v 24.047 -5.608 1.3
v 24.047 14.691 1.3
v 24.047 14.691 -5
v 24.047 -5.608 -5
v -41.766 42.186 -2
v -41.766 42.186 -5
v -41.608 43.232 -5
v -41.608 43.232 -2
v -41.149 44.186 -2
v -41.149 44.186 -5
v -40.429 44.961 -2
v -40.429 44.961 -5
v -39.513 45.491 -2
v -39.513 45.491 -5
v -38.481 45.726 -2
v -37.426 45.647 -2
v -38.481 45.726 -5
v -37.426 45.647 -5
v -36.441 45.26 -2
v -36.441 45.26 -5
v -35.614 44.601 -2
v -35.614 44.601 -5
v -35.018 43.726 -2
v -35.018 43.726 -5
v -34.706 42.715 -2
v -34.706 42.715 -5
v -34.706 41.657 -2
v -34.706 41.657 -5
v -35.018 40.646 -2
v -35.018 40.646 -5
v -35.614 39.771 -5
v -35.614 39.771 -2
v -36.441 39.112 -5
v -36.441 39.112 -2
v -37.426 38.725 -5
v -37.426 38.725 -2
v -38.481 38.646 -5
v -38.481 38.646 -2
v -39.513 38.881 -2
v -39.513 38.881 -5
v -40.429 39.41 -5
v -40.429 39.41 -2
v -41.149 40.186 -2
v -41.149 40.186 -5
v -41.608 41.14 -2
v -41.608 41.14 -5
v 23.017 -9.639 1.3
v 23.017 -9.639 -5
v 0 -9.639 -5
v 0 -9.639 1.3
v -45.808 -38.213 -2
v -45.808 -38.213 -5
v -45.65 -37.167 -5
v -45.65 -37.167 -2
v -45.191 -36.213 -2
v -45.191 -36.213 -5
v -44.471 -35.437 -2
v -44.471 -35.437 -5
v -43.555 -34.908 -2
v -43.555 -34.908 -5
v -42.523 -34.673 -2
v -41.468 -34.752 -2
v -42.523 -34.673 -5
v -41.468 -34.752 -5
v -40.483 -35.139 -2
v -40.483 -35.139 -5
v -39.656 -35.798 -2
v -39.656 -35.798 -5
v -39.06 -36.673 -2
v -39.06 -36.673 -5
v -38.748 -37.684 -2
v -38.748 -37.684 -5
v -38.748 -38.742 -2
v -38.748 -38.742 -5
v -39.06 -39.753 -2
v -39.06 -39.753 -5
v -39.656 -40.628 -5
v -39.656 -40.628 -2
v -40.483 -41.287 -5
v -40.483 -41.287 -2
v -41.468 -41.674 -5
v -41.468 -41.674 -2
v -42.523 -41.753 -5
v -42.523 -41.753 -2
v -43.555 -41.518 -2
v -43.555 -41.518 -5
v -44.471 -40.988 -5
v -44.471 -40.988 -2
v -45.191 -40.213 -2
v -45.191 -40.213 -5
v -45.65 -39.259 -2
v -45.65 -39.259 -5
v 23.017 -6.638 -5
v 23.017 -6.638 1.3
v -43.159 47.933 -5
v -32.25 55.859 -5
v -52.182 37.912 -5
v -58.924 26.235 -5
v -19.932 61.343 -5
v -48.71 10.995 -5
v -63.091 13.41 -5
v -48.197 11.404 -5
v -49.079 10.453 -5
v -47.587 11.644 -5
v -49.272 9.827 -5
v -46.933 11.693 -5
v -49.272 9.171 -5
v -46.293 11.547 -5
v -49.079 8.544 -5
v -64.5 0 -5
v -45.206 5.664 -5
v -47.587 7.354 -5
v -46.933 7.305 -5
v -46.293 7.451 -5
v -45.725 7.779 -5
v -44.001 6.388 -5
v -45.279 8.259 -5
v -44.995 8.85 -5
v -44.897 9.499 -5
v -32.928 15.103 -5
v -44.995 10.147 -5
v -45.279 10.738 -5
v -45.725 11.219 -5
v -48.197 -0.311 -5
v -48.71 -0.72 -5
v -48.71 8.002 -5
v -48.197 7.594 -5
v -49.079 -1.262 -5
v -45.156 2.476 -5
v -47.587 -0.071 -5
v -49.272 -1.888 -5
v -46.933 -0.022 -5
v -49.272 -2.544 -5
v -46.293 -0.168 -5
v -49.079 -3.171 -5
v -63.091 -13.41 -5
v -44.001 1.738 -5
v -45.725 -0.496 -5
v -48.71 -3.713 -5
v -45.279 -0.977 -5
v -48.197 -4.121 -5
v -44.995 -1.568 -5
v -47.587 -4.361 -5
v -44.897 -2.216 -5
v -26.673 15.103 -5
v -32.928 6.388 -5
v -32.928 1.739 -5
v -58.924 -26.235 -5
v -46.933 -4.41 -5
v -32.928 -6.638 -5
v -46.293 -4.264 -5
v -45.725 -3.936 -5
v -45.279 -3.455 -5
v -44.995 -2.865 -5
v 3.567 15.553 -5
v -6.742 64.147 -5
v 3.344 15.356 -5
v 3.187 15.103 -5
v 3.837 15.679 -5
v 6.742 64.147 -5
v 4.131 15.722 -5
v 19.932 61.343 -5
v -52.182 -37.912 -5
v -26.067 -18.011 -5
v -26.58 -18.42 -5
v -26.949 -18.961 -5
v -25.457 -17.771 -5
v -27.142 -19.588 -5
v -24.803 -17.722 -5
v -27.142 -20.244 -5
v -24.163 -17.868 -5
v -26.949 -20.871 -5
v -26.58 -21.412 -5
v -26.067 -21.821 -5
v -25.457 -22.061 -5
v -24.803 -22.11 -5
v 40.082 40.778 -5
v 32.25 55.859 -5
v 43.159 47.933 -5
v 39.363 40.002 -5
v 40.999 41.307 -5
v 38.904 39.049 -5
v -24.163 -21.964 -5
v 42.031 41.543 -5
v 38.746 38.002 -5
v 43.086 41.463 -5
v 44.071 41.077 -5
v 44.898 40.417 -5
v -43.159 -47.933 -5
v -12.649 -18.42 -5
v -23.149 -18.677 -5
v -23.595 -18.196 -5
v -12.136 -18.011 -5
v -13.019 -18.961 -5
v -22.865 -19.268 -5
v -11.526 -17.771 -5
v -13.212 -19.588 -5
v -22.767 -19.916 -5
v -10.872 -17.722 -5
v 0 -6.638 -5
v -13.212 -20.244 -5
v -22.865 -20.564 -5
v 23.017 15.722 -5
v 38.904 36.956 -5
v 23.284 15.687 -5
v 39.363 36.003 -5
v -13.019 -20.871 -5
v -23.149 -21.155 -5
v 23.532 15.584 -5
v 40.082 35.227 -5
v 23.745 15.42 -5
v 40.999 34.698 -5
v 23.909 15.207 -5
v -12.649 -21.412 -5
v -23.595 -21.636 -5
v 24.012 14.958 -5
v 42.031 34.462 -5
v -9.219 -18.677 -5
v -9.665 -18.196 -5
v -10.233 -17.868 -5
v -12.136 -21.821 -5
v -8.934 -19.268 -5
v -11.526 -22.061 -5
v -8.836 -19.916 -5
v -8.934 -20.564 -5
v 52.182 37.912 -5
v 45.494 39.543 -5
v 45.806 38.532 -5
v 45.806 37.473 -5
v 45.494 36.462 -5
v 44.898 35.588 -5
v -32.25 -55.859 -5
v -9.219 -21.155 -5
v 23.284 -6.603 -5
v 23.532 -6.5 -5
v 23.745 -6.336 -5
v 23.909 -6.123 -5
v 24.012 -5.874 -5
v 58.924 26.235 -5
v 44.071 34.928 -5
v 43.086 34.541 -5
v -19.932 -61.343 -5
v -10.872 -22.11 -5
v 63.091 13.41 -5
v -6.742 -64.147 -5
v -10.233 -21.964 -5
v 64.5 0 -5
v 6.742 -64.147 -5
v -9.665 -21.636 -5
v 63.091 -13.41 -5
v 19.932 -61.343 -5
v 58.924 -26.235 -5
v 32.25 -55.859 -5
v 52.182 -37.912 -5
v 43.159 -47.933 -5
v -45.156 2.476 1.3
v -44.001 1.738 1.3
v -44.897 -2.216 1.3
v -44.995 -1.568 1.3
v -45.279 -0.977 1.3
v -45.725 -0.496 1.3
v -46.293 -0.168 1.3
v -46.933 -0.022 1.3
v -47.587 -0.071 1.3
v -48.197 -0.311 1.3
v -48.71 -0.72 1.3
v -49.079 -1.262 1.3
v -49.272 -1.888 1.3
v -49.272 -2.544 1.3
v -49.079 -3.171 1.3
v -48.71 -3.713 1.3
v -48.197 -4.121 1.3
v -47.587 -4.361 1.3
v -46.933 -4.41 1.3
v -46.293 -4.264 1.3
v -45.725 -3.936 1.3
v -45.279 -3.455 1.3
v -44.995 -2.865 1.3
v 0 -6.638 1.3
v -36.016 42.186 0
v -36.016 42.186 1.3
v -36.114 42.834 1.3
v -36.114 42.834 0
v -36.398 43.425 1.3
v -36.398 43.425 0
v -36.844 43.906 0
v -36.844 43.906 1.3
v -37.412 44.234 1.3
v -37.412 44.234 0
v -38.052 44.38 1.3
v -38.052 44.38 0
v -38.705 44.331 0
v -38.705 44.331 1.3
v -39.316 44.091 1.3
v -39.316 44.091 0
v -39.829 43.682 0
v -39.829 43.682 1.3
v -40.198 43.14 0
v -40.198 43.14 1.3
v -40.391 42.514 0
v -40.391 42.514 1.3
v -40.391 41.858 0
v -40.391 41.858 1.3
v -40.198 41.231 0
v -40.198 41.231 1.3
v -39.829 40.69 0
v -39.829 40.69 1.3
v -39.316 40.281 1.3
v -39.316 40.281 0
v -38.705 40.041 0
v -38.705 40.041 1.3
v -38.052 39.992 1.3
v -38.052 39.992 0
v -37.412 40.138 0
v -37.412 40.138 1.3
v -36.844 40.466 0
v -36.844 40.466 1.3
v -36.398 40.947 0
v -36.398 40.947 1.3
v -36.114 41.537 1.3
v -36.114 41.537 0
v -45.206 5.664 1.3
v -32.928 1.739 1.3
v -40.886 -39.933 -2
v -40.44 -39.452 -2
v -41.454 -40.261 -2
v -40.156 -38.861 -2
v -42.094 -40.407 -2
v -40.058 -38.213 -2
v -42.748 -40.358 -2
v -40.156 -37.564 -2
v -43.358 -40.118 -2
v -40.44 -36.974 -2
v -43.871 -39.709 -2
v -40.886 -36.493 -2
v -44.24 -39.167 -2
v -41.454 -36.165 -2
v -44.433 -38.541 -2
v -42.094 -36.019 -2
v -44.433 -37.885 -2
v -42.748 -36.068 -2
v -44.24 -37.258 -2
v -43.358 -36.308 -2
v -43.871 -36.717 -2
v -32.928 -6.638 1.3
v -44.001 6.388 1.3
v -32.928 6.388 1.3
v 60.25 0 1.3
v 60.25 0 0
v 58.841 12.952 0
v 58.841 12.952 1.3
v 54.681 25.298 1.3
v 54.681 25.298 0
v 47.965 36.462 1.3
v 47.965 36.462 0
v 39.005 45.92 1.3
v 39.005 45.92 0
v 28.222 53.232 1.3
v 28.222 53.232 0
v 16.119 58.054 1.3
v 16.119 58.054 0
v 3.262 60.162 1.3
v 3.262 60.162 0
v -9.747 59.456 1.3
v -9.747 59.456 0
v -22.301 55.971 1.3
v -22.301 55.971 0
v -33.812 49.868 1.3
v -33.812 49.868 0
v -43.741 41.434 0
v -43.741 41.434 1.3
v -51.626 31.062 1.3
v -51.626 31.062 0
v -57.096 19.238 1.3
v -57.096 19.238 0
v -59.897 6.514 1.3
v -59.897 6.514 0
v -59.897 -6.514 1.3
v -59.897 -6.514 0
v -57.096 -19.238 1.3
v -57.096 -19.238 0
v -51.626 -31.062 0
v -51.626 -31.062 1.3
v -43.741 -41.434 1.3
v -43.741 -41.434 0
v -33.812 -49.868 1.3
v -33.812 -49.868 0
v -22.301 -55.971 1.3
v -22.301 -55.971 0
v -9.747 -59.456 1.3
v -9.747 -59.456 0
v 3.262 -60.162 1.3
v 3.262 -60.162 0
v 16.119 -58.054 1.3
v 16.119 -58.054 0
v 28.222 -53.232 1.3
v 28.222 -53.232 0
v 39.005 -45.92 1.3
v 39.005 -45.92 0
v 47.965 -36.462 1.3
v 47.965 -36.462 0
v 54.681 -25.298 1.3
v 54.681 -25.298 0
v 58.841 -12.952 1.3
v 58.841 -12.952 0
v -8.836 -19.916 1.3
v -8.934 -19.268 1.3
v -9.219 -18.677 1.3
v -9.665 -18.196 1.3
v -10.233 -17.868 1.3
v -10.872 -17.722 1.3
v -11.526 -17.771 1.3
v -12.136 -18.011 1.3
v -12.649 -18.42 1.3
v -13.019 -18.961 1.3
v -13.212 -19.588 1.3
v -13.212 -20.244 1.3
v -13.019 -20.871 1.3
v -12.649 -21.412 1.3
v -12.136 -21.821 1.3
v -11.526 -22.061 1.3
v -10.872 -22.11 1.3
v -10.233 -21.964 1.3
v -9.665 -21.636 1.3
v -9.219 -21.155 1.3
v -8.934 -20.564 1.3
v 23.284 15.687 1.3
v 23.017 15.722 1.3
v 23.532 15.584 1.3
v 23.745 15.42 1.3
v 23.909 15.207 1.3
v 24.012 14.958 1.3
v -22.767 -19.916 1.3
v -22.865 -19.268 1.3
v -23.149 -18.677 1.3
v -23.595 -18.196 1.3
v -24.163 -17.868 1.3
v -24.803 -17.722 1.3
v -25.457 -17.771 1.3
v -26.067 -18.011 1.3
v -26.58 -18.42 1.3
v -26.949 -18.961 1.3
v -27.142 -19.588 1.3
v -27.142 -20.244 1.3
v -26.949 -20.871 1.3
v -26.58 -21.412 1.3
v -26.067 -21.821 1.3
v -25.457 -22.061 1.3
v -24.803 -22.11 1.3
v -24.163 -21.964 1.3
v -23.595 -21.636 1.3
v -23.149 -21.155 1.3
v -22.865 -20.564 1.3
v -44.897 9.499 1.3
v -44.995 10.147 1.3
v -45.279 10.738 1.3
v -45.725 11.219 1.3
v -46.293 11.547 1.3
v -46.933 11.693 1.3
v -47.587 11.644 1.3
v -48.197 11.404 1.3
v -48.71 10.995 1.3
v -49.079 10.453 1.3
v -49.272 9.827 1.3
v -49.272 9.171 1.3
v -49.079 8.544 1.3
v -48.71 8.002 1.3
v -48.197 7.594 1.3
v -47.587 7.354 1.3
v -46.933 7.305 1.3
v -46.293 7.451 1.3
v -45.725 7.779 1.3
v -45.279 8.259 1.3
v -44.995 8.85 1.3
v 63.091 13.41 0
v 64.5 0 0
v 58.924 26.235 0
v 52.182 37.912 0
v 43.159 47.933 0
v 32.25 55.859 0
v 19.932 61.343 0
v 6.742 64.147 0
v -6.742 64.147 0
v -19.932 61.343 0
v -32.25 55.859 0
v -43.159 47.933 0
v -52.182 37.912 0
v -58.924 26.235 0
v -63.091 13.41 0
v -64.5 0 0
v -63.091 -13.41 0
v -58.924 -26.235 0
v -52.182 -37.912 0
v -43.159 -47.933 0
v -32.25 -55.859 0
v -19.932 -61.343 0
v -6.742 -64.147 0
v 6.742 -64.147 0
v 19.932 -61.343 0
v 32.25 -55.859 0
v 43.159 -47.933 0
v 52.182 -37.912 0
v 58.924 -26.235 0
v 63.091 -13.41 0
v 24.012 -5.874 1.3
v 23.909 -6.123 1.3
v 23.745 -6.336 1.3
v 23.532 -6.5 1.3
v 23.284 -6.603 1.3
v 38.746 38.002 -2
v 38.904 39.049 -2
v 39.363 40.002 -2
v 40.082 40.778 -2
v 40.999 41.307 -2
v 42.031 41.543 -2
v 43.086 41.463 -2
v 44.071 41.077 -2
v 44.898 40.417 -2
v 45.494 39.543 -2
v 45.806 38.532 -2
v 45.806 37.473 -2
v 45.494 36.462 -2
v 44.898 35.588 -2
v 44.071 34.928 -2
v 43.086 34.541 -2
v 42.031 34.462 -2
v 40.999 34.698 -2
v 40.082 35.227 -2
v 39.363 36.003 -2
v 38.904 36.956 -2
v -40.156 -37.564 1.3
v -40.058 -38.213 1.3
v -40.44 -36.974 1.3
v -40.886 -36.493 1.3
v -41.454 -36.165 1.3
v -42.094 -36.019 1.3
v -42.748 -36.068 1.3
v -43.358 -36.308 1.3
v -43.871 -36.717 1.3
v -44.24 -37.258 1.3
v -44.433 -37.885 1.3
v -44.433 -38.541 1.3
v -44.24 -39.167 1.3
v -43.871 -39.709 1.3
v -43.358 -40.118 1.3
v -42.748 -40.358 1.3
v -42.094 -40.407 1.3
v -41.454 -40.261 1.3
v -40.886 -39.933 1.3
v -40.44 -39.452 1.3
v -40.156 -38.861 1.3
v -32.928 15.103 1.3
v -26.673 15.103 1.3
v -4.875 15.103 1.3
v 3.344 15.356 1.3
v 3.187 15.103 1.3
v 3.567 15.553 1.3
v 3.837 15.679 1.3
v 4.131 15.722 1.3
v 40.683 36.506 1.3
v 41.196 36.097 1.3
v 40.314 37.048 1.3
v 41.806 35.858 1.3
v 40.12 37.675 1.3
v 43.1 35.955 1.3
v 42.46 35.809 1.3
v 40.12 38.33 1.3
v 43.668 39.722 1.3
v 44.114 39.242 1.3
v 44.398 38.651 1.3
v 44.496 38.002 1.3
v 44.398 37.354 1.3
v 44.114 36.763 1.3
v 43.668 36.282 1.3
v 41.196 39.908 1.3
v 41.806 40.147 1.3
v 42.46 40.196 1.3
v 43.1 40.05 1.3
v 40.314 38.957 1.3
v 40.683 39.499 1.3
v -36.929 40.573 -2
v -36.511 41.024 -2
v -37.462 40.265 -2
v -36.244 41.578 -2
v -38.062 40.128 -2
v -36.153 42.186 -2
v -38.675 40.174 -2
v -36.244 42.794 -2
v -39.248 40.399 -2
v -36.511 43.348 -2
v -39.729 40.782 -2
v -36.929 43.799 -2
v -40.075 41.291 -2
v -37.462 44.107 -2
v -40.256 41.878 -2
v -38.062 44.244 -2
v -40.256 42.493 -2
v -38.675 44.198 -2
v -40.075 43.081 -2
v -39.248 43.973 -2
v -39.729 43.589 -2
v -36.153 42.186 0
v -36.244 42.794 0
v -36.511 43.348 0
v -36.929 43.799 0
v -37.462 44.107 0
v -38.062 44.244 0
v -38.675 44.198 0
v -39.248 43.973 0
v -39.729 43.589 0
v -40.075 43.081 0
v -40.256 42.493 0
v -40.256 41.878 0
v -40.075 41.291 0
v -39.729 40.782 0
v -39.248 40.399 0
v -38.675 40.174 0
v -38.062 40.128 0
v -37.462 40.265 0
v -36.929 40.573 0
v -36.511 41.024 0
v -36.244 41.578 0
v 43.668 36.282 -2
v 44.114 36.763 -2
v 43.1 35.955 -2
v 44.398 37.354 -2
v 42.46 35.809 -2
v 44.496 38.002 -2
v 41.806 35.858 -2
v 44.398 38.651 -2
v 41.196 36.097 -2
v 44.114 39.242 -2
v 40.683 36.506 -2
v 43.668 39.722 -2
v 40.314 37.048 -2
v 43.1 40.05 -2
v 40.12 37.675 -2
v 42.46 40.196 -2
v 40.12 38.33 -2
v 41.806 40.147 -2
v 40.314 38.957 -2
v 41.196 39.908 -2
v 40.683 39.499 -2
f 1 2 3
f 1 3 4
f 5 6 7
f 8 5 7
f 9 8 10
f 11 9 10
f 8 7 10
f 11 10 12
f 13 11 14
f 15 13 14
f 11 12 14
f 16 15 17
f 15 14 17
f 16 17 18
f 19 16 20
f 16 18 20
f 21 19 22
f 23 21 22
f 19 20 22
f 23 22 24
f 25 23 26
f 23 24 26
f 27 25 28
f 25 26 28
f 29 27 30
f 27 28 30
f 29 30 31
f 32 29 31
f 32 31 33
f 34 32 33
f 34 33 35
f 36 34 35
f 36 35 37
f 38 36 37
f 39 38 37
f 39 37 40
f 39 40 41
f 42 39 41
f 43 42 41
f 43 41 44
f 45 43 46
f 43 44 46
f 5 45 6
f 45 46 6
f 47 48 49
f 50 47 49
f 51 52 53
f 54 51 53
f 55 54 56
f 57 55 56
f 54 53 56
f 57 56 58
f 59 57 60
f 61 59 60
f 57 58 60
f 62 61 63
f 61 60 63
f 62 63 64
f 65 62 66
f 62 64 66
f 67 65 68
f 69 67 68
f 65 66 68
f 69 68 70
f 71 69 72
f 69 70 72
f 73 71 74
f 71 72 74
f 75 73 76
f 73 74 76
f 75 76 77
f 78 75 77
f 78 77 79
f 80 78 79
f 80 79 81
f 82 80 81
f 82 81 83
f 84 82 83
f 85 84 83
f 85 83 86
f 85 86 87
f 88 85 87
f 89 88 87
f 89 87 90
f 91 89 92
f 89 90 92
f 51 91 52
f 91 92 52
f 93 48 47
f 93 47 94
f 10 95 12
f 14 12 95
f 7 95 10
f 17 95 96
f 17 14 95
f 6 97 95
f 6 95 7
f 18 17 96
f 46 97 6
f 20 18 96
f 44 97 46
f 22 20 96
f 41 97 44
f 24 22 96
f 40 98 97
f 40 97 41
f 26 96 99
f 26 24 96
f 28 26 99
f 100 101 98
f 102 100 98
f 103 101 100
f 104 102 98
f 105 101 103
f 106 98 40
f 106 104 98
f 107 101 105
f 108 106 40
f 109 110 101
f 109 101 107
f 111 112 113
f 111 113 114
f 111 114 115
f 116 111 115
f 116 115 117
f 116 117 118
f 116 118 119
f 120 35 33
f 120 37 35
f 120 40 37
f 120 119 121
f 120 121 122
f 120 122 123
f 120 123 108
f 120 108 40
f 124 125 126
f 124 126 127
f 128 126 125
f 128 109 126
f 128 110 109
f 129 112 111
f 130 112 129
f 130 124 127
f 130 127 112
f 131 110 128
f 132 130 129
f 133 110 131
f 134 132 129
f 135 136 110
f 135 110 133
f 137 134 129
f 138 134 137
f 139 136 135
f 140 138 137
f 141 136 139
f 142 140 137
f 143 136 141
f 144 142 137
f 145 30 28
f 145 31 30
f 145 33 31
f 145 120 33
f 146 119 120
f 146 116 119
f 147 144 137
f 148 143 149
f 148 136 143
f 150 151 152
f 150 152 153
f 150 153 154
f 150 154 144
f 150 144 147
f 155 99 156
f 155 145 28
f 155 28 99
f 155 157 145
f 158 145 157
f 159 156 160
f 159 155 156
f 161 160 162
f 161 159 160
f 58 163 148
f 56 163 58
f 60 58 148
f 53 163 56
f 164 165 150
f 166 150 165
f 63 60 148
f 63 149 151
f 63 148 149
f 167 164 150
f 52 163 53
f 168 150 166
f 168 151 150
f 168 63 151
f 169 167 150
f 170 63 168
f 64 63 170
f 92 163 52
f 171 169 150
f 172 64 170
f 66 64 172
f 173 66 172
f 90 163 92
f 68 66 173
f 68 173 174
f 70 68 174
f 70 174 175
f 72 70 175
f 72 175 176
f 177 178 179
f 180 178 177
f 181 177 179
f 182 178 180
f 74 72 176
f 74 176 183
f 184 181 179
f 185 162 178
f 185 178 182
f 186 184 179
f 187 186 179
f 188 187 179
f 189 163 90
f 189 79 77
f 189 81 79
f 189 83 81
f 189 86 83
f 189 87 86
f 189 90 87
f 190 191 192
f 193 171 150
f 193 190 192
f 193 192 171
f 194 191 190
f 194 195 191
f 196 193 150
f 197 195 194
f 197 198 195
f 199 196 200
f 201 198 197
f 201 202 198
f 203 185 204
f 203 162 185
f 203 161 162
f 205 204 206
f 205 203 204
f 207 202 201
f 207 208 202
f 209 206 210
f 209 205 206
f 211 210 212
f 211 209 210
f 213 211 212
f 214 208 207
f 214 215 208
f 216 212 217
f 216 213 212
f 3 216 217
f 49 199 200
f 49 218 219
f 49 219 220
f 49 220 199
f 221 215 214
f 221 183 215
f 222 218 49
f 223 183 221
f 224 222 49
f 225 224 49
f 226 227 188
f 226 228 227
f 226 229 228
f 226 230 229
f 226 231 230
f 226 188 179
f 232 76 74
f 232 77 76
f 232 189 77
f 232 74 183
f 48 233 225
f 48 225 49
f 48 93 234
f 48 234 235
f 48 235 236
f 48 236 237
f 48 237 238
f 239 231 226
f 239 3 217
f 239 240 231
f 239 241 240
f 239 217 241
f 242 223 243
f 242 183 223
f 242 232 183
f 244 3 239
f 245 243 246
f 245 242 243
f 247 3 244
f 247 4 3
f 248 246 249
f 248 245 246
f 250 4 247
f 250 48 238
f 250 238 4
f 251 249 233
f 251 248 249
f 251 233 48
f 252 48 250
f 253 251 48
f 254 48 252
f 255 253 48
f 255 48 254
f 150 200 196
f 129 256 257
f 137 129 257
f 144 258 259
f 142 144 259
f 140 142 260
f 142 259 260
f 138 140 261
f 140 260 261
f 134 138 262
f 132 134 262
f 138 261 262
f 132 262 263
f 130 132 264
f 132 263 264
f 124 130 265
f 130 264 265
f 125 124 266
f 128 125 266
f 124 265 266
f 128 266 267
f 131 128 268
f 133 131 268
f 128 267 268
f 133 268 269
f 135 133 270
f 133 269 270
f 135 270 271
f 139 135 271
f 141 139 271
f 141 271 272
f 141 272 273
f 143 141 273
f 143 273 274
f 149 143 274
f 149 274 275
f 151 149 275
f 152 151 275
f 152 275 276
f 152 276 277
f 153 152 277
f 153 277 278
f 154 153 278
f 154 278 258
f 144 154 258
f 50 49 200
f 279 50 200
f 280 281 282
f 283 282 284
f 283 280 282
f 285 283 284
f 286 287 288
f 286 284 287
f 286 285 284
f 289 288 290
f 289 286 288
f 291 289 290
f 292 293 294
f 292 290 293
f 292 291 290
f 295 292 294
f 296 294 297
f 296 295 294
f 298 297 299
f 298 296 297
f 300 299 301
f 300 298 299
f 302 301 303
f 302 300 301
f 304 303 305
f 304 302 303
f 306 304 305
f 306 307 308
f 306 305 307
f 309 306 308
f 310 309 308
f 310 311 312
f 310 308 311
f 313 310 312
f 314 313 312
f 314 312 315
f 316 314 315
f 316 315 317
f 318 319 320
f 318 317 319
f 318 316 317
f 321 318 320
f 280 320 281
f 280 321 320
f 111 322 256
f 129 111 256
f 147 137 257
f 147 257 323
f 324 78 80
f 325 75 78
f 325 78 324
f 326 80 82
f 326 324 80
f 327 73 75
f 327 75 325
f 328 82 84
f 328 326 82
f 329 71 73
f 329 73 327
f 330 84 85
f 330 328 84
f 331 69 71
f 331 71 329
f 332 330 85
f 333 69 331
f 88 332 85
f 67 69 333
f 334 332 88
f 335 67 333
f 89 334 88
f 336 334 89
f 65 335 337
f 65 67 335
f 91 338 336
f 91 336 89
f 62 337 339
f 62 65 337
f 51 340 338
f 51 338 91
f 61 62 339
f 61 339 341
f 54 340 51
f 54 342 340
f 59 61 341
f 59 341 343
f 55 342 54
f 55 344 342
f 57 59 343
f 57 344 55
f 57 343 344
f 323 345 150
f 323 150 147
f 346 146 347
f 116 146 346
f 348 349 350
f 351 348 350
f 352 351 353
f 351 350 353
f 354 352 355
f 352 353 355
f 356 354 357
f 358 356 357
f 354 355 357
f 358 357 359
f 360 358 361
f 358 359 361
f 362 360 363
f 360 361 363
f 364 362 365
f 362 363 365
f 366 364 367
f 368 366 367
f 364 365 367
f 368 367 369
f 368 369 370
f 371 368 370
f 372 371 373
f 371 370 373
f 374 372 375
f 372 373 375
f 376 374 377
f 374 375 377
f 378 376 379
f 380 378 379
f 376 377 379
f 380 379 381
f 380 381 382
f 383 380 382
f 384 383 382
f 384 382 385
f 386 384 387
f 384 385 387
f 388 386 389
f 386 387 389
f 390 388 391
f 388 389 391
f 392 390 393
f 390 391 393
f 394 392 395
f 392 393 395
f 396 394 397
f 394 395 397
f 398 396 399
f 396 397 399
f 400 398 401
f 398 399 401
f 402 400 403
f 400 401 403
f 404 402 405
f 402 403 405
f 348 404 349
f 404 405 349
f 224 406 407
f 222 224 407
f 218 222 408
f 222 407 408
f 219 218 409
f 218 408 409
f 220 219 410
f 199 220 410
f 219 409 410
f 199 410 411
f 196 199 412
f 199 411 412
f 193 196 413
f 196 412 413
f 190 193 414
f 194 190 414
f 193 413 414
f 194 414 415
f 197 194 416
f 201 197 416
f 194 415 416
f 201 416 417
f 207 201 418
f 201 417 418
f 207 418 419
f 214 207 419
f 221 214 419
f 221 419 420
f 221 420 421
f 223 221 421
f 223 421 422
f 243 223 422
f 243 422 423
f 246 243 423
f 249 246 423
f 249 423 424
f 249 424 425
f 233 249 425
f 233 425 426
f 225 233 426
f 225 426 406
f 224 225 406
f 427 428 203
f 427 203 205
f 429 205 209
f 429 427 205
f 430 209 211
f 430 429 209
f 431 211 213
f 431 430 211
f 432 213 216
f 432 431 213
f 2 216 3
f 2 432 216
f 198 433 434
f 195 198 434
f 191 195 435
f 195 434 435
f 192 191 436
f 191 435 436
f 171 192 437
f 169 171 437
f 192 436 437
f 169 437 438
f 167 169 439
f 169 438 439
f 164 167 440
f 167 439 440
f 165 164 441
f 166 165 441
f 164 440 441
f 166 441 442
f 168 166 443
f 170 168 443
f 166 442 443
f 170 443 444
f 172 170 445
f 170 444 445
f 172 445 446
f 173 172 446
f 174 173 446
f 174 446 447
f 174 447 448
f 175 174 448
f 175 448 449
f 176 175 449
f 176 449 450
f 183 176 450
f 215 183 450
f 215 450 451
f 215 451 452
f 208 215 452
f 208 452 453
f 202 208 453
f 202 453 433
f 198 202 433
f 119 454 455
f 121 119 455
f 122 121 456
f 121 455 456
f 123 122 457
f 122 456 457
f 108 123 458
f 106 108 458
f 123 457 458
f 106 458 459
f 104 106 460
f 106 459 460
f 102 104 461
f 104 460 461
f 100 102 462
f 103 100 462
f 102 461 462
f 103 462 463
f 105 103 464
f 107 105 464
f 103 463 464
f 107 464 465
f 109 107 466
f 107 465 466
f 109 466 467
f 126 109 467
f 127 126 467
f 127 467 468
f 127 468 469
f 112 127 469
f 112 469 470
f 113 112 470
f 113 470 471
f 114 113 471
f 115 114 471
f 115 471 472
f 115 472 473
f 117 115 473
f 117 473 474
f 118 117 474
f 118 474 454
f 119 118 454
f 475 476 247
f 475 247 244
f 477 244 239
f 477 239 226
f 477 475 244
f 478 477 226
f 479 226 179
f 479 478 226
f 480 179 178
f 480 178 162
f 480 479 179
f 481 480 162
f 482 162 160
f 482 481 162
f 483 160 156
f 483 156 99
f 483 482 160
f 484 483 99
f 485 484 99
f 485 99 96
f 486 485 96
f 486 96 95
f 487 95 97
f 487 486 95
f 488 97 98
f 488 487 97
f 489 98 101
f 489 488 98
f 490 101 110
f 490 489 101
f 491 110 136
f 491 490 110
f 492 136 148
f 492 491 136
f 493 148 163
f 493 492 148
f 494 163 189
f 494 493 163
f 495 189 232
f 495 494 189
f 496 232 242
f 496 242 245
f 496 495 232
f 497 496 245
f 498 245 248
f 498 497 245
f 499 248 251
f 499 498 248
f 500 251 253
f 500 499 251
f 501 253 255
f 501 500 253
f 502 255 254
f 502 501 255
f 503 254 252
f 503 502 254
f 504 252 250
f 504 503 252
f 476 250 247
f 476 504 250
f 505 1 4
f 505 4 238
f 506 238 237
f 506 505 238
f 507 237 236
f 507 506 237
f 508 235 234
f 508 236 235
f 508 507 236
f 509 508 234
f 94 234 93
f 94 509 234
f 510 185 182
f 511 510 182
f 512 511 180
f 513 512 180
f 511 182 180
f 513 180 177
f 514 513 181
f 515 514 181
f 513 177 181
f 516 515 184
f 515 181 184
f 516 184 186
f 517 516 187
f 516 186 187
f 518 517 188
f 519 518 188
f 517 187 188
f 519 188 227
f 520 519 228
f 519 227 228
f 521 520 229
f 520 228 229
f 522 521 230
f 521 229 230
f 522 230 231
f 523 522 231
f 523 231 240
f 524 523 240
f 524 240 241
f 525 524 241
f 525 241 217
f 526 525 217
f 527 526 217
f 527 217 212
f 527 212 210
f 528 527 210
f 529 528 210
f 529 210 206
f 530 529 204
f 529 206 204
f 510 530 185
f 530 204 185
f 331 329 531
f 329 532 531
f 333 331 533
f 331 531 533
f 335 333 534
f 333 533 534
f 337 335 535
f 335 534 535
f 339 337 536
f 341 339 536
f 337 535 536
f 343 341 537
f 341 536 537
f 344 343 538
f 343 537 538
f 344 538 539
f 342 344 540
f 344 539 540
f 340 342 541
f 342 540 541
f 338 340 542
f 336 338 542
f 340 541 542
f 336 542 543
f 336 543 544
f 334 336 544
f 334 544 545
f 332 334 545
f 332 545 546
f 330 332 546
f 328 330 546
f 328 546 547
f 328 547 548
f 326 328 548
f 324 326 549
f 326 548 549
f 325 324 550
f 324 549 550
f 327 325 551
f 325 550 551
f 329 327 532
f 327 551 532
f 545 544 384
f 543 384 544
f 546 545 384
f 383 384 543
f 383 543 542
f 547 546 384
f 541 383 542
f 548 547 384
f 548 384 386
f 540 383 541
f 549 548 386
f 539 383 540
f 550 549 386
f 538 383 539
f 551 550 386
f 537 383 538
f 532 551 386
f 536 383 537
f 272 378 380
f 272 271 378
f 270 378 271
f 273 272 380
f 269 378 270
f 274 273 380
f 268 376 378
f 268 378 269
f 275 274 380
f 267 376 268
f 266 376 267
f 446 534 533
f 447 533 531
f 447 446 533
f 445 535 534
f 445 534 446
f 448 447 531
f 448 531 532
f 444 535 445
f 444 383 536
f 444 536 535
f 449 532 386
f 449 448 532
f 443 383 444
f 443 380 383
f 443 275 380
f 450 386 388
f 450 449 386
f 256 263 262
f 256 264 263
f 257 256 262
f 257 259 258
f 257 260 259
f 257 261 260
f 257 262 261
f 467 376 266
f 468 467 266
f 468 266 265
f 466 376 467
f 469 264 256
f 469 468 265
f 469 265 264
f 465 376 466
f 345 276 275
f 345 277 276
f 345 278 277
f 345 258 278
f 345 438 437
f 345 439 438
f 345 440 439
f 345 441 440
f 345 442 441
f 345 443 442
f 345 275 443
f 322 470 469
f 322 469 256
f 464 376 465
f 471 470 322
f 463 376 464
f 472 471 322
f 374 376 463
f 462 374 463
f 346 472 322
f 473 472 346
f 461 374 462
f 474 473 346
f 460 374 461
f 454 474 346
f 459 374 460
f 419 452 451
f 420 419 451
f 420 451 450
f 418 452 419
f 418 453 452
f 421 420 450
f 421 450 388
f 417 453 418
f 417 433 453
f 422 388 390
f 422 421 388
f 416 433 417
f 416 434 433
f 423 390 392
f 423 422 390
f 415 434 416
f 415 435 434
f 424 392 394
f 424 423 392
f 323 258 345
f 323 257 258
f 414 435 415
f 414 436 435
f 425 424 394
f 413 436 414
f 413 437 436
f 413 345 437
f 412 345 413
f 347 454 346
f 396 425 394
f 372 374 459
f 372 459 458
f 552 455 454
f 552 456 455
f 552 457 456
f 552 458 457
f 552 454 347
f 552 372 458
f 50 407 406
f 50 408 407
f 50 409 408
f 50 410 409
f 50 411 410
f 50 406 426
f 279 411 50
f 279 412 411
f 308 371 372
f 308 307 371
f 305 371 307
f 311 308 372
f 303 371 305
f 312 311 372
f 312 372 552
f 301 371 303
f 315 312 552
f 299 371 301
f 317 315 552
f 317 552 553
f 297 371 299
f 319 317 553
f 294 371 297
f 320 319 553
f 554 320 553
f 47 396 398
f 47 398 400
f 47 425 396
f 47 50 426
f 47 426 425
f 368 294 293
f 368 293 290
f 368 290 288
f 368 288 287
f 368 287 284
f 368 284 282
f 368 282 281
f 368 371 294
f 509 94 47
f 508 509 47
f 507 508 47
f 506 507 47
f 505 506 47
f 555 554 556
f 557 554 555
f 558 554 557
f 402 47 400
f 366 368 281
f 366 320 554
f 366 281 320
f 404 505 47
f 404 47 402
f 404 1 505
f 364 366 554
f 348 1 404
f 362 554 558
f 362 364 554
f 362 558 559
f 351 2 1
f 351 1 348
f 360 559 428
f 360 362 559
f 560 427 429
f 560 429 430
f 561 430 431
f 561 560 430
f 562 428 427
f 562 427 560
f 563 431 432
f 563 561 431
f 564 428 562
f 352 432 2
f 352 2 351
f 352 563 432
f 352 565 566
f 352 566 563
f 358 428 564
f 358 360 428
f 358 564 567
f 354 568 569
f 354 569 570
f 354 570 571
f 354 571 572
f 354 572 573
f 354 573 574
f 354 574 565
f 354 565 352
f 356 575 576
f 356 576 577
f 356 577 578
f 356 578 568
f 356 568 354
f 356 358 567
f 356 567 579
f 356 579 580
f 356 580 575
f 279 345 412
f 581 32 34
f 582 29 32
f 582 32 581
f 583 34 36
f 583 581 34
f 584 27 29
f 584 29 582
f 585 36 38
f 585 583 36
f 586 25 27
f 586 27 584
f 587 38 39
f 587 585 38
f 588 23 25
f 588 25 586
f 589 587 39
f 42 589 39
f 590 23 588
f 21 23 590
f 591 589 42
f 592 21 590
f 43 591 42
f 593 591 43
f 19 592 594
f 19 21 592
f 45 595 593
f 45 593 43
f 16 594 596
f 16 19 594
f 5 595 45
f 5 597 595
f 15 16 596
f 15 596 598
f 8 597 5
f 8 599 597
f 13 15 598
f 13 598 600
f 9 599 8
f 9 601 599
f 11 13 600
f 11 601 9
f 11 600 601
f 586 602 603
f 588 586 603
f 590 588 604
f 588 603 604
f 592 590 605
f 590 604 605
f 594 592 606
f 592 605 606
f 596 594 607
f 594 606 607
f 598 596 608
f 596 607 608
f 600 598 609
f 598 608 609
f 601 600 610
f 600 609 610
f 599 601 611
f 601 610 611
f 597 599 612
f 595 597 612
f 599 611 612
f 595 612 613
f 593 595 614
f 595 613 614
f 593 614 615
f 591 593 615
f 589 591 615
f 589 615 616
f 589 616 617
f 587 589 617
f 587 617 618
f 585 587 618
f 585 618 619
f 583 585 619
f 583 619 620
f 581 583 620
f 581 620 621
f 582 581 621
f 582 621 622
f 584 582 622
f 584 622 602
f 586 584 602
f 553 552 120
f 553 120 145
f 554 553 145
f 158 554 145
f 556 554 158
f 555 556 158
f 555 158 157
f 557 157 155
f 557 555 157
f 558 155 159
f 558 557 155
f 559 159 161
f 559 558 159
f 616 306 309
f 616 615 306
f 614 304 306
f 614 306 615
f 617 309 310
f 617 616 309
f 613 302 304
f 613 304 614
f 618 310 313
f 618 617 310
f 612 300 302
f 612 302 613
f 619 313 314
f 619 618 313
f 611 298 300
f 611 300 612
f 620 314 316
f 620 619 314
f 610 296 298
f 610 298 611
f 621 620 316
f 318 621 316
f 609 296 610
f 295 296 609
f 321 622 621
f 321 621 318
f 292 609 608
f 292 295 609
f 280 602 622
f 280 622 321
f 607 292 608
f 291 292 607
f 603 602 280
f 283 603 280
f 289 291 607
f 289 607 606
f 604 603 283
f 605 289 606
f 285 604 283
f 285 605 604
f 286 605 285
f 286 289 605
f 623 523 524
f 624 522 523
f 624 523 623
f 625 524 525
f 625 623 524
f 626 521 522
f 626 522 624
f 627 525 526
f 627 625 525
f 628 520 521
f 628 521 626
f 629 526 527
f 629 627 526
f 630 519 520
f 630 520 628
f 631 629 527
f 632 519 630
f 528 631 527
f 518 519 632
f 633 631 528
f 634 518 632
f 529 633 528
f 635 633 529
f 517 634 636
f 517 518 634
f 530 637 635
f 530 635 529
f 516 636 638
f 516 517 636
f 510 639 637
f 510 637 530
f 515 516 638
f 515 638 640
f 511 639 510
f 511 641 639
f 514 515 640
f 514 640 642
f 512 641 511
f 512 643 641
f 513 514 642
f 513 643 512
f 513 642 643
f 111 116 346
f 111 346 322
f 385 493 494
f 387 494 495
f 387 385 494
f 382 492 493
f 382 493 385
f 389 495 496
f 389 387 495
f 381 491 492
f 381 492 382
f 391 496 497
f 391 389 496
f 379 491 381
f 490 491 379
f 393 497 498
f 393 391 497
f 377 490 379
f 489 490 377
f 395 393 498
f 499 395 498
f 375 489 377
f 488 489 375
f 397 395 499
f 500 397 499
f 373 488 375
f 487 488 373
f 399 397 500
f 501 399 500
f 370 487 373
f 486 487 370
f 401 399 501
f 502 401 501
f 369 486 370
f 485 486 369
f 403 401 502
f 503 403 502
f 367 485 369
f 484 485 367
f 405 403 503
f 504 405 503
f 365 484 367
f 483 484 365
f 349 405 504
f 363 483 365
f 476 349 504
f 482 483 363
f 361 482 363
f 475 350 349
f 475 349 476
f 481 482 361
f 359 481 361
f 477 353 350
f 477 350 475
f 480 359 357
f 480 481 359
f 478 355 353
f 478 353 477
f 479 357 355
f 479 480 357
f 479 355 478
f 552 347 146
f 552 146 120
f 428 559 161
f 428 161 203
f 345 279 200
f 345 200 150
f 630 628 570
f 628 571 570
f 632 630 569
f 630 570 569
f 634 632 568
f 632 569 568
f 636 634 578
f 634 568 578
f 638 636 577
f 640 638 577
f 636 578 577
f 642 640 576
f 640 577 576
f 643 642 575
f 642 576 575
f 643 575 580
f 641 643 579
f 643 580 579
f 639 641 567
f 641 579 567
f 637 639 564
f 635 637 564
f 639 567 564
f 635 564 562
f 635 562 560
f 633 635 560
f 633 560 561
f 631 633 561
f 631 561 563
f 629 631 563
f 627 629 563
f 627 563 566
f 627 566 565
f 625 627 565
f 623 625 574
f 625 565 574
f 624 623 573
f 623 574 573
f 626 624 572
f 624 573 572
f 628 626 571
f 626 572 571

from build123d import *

# Parameters (mm, degrees)
SCHIZZO1_R                   = 60.25
ESTRUSIONE_ESTRUSIONE1_DEPTH = 1.3
SCHIZZO1_6_R                 = 64.5
SCHIZZO1_6_R_2               = 60.25
ESTRUSIONE_ESTRUSIONE2_DEPTH = 5
ESTRUSIONE_ESTRUSIONE3_START = 5
SCHIZZO2_R                   = 60.25
ESTRUSIONE_ESTRUSIONE3_DEPTH = 5
SCHIZZO4_R                   = 2.2
TAGLIO_ESTRUSIONE1_DEPTH     = 22.55
SCHIZZO5_R                   = 2.2
SCHIZZO5_R_2                 = 2.063369246
TAGLIO_ESTRUSIONE2_DEPTH     = 92.35370819
SCHIZZO6_R                   = 3.55
TAGLIO_ESTRUSIONE3_DEPTH     = 3
TAGLIO_ESTRUSIONE4_DEPTH     = 92.434074611
TAGLIO_ESTRUSIONE5_DEPTH     = 92.434074611
SCHIZZO19_R                  = 2.2
TAGLIO_ESTRUSIONE6_DEPTH     = 92.434074611
SCHIZZO21_W                  = 23.016895474
SCHIZZO21_H                  = 3.000921099
TAGLIO_ESTRUSIONE7_DEPTH     = 92.434074611
SCHIZZO23_W                  = 21.797647442
SCHIZZO23_H                  = 17.331114079
TAGLIO_ESTRUSIONE8_DEPTH     = 92.434074611
SCHIZZO24_W                  = 6.255388186
SCHIZZO24_H                  = 0.117454314
TAGLIO_ESTRUSIONE9_DEPTH     = 92.35370819
SCHIZZO25_W                  = 6.255388186
SCHIZZO25_H                  = 0.117454314
TAGLIO_ESTRUSIONE10_DEPTH    = 92.434074611


with BuildPart() as part:
    # Schizzo1 → Estrusione-Estrusione1 (new body)
    with BuildSketch(Plane.XY):
        Circle(SCHIZZO1_R)
    extrude(amount=ESTRUSIONE_ESTRUSIONE1_DEPTH)


with BuildPart() as body_2:
    # Schizzo1<6> → Estrusione-Estrusione2 (new body)
    with BuildSketch(Plane.XY):
        Circle(SCHIZZO1_6_R)
        Circle(SCHIZZO1_6_R_2, mode=Mode.SUBTRACT)
    extrude(amount=-ESTRUSIONE_ESTRUSIONE2_DEPTH)


with BuildPart() as estrusione_estrusione3_tool:
    # Schizzo2 → Estrusione-Estrusione3 (new body)
    with BuildSketch(Plane(origin=(0, 0, 0), x_dir=(-1, 0, 0), z_dir=(0, 0, -1)).offset(ESTRUSIONE_ESTRUSIONE3_START)):
        Circle(SCHIZZO2_R)
    extrude(amount=-ESTRUSIONE_ESTRUSIONE3_DEPTH)


with BuildPart() as part_1:
    add(part.part)


with BuildPart() as part_2:
    # Estrusione-Estrusione3: joined with estrusione_estrusione3_tool
    add(part_1.part.fuse(estrusione_estrusione3_tool.part, body_2.part, tol=0.00001))

    # Schizzo4 → Taglio-Estrusione1 (cut)
    with BuildSketch(Plane.XY):
        with Locations((-38.215953468, 42.185917173)):
            Circle(SCHIZZO4_R)
        with Locations((42.295854852, 38.002469644)):
            Circle(SCHIZZO4_R)
        with Locations((-42.258051235, -38.212951628)):
            Circle(SCHIZZO4_R)
    extrude(amount=TAGLIO_ESTRUSIONE1_DEPTH, mode=Mode.SUBTRACT)

    # Schizzo5 → Taglio-Estrusione2 (cut, through all)
    with BuildSketch(Plane.XY):
        with Locations((42.295854852, 38.002469644)):
            Circle(SCHIZZO5_R)
        with Locations((-38.215953468, 42.185917173)):
            Circle(SCHIZZO5_R_2)
        with Locations((-42.258051235, -38.212951628)):
            Circle(SCHIZZO5_R)
    extrude(amount=-TAGLIO_ESTRUSIONE2_DEPTH, mode=Mode.SUBTRACT)

    # Schizzo6 → Taglio-Estrusione3 (cut)
    with BuildSketch(Plane(origin=(0, 0, -5), x_dir=(-1, 0, 0), z_dir=(0, 0, -1))):
        with Locations((-42.295854852, 38.002469644)):
            Circle(SCHIZZO6_R)
        with Locations((38.215953468, 42.185917173)):
            Circle(SCHIZZO6_R)
        with Locations((42.258051235, -38.212951628)):
            Circle(SCHIZZO6_R)
    extrude(amount=-TAGLIO_ESTRUSIONE3_DEPTH, mode=Mode.SUBTRACT)

    # Schizzo16 → Taglio-Estrusione4 (cut, through all)
    with BuildSketch(Plane.XY.offset(1.3)):
        with BuildLine():
            Line((-32.928448826, 14.986032767), (-25.1744035, 14.986032767))
            Line((-25.1744035, 14.986032767), (-25.1744035, -0.412845979))
            Line((-25.1744035, -0.412845979), (-8.028134258, -0.412845979))
            Line((-8.028134258, -0.412845979), (-6.936015198, 0.679273081))
            Line((-6.936015198, 0.679273081), (-6.936015198, 13.042885081))
            ThreePointArc((-6.936015198, 13.042885081), (-6.332478846, 14.499950729), (-4.875413198, 15.103487081))
            Line((-4.875413198, 15.103487081), (3.18719168, 15.103487081))
            ThreePointArc((3.18719168, 15.103487081), (3.567159045, 15.553378343), (4.131478144, 15.721667681))
            Line((4.131478144, 15.721667681), (23.016895474, 15.721667681))
            ThreePointArc((23.016895474, 15.721667681), (23.745428298, 15.419899505), (24.047196474, 14.691366681))
            Line((24.047196474, 14.691366681), (24.047196474, -5.607623621))
            ThreePointArc((24.047196474, -5.607623621), (23.745428298, -6.336156444), (23.016895474, -6.637924621))
            Line((23.016895474, -6.637924621), (-32.928448826, -6.637924621))
            Line((-32.928448826, -6.637924621), (-32.928448826, 14.986032767))
        make_face()
    extrude(amount=-TAGLIO_ESTRUSIONE4_DEPTH, mode=Mode.SUBTRACT)

    # Schizzo18 → Taglio-Estrusione5 (cut, through all)
    with BuildSketch(Plane(origin=(0, 0, -5), x_dir=(-1, 0, 0), z_dir=(0, 0, -1))):
        Polygon((44.000647486, 6.387761029), (32.928448826, 6.387761029), (32.928448826, 1.738887547), (44.000647486, 1.737761029), (45.156092105, 2.475905944), (45.20554645, 5.664349962), align=None)
    extrude(amount=-TAGLIO_ESTRUSIONE5_DEPTH, mode=Mode.SUBTRACT)

    # Schizzo19 → Taglio-Estrusione6 (cut, through all)
    with BuildSketch(Plane.XY.offset(1.3)):
        with Locations((-47.096963083, 9.498765652)):
            Circle(SCHIZZO19_R)
        with Locations((-47.096963083, -2.216170811)):
            Circle(SCHIZZO19_R)
        with Locations((-24.967055149, -19.916033665)):
            Circle(SCHIZZO19_R)
        with Locations((-11.036476343, -19.916033665)):
            Circle(SCHIZZO19_R)
    extrude(amount=-TAGLIO_ESTRUSIONE6_DEPTH, mode=Mode.SUBTRACT)

    # Schizzo21 → Taglio-Estrusione7 (cut, through all)
    with BuildSketch(Plane(origin=(0, 0, -5), x_dir=(-1, 0, 0), z_dir=(0, 0, -1))):
        with Locations((-11.508447737, -8.138385171)):
            Rectangle(SCHIZZO21_W, SCHIZZO21_H)
    extrude(amount=-TAGLIO_ESTRUSIONE7_DEPTH, mode=Mode.SUBTRACT)

    # Schizzo23 → Taglio-Estrusione8 (cut, through all)
    with BuildSketch(Plane(origin=(0, 0, -5), x_dir=(-1, 0, 0), z_dir=(0, 0, -1))):
        with Locations((15.774236919, 6.437930042)):
            Rectangle(SCHIZZO23_W, SCHIZZO23_H)
    extrude(amount=-TAGLIO_ESTRUSIONE8_DEPTH, mode=Mode.SUBTRACT)

    # Schizzo24 → Taglio-Estrusione9 (cut, through all)
    with BuildSketch(Plane.XY):
        with Locations((-29.800754733, 15.044759924)):
            Rectangle(SCHIZZO24_W, SCHIZZO24_H)
    extrude(amount=-TAGLIO_ESTRUSIONE9_DEPTH, mode=Mode.SUBTRACT)

    # Schizzo25 → Taglio-Estrusione10 (cut, through all)
    with BuildSketch(Plane.XY.offset(1.3)):
        with Locations((-29.800754733, 15.044759924)):
            Rectangle(SCHIZZO25_W, SCHIZZO25_H)
    extrude(amount=-TAGLIO_ESTRUSIONE10_DEPTH, mode=Mode.SUBTRACT)


solid = part_2.part
